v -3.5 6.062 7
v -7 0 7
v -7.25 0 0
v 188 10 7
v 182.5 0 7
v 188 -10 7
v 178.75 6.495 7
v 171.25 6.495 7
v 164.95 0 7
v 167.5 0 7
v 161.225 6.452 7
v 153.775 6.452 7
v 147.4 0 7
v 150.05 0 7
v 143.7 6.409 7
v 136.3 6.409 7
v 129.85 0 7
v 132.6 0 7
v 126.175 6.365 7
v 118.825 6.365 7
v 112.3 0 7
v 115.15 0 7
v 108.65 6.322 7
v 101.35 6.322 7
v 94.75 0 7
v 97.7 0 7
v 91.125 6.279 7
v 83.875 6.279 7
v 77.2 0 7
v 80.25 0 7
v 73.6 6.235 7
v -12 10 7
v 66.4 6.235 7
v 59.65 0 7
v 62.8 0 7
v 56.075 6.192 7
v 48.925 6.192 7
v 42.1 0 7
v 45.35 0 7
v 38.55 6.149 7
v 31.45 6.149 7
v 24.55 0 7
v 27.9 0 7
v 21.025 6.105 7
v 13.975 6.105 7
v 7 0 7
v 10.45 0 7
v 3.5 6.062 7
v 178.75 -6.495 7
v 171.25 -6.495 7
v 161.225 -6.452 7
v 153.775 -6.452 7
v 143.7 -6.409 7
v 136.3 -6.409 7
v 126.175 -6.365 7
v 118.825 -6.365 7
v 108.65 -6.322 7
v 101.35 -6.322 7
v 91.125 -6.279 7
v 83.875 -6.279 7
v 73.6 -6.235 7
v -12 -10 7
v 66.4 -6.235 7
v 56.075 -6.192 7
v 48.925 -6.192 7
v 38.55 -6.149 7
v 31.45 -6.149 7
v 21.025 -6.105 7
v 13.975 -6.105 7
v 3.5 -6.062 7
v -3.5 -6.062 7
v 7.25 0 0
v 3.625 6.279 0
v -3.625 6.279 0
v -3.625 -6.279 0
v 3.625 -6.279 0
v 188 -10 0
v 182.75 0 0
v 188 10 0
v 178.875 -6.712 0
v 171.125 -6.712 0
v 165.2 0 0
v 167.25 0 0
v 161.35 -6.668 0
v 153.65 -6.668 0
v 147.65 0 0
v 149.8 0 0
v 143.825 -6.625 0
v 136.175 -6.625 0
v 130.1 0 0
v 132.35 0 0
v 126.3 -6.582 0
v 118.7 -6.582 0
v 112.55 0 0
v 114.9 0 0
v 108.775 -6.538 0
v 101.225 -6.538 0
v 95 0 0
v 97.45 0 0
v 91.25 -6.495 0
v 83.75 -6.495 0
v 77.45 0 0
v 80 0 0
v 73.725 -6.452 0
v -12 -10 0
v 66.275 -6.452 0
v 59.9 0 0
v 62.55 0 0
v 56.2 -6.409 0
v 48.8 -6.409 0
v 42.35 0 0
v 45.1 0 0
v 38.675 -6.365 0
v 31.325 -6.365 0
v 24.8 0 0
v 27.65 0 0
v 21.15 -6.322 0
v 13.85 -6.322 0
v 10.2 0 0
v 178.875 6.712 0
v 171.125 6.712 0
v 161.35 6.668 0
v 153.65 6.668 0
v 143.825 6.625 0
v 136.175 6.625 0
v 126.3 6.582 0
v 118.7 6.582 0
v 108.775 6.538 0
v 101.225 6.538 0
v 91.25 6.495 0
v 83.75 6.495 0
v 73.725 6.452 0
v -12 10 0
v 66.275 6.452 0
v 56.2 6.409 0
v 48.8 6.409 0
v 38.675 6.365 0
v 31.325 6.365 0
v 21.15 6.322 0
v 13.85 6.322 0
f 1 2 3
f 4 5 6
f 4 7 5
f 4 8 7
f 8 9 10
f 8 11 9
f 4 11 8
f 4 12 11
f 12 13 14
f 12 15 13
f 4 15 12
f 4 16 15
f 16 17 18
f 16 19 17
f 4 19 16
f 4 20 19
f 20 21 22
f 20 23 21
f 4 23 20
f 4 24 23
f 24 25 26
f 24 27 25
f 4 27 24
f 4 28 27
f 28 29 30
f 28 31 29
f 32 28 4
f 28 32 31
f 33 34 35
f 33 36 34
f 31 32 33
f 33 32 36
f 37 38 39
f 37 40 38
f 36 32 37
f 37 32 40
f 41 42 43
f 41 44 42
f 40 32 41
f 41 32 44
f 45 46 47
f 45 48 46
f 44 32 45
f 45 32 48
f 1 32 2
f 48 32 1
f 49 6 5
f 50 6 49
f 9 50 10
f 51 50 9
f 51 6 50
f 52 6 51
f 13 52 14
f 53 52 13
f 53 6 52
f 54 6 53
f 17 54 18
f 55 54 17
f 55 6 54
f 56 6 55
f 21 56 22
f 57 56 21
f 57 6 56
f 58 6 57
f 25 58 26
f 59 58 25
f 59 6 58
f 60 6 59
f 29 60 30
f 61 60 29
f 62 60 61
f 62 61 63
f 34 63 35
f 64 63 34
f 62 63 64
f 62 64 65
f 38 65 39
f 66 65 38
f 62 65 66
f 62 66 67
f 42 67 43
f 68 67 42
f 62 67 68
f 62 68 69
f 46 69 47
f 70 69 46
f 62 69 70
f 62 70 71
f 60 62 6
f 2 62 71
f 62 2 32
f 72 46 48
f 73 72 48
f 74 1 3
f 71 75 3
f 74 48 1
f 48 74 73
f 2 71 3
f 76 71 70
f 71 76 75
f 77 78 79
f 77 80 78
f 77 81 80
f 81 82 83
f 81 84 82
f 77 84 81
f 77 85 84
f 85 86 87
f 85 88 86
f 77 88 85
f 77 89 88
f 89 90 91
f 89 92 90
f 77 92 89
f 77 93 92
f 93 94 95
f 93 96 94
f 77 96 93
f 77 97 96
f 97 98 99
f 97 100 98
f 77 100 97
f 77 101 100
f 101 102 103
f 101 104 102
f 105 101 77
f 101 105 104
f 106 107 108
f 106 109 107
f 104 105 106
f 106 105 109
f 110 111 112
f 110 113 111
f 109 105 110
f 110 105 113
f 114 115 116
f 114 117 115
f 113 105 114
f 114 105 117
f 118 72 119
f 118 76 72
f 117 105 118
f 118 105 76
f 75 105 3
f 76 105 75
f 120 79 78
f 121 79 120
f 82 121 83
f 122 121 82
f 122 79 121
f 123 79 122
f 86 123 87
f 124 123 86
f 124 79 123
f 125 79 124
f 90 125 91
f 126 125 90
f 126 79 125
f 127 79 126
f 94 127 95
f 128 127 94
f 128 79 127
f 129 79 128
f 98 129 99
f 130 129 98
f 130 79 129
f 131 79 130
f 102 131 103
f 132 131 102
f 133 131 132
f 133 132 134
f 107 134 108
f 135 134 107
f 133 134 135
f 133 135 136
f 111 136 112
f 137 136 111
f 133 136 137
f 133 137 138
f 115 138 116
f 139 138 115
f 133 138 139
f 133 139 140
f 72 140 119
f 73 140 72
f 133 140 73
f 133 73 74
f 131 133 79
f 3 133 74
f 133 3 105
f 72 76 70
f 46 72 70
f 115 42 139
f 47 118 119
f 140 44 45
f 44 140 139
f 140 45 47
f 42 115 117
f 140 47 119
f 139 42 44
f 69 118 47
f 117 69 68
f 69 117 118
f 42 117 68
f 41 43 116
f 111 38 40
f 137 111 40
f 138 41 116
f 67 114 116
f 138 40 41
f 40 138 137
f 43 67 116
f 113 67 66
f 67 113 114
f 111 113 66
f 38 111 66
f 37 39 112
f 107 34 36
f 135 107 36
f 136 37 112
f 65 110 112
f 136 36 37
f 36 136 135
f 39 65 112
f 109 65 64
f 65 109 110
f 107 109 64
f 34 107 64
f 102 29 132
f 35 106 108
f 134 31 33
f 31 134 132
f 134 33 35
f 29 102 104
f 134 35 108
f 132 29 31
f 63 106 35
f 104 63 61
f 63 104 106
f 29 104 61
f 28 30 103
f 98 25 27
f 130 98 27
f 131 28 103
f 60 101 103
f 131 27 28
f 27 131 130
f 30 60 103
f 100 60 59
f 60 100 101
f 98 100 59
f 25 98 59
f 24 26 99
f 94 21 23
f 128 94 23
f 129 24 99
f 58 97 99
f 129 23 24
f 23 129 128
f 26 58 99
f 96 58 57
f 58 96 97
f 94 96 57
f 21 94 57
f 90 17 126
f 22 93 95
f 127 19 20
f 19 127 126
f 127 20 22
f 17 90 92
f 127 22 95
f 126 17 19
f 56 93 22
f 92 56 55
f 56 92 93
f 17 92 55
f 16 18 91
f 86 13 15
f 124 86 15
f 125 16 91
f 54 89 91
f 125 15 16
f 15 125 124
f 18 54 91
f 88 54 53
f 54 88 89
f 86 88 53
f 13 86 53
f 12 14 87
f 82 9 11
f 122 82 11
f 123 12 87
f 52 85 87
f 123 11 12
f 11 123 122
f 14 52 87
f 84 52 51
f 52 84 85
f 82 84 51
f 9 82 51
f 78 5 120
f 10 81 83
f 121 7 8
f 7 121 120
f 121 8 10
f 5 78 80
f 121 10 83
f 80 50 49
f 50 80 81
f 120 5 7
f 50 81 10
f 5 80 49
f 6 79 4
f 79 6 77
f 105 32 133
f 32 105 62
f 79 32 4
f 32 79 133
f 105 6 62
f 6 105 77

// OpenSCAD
difference() {
    translate([-12,-10,0])

cube([200,20,7]);
for (i=[0:10:100]) {
    
        translate([i*1.75,0,0])
            cylinder(7,(14.5+i/100)/2,(14+i/100)/2,$fn=6);
    
}
}
